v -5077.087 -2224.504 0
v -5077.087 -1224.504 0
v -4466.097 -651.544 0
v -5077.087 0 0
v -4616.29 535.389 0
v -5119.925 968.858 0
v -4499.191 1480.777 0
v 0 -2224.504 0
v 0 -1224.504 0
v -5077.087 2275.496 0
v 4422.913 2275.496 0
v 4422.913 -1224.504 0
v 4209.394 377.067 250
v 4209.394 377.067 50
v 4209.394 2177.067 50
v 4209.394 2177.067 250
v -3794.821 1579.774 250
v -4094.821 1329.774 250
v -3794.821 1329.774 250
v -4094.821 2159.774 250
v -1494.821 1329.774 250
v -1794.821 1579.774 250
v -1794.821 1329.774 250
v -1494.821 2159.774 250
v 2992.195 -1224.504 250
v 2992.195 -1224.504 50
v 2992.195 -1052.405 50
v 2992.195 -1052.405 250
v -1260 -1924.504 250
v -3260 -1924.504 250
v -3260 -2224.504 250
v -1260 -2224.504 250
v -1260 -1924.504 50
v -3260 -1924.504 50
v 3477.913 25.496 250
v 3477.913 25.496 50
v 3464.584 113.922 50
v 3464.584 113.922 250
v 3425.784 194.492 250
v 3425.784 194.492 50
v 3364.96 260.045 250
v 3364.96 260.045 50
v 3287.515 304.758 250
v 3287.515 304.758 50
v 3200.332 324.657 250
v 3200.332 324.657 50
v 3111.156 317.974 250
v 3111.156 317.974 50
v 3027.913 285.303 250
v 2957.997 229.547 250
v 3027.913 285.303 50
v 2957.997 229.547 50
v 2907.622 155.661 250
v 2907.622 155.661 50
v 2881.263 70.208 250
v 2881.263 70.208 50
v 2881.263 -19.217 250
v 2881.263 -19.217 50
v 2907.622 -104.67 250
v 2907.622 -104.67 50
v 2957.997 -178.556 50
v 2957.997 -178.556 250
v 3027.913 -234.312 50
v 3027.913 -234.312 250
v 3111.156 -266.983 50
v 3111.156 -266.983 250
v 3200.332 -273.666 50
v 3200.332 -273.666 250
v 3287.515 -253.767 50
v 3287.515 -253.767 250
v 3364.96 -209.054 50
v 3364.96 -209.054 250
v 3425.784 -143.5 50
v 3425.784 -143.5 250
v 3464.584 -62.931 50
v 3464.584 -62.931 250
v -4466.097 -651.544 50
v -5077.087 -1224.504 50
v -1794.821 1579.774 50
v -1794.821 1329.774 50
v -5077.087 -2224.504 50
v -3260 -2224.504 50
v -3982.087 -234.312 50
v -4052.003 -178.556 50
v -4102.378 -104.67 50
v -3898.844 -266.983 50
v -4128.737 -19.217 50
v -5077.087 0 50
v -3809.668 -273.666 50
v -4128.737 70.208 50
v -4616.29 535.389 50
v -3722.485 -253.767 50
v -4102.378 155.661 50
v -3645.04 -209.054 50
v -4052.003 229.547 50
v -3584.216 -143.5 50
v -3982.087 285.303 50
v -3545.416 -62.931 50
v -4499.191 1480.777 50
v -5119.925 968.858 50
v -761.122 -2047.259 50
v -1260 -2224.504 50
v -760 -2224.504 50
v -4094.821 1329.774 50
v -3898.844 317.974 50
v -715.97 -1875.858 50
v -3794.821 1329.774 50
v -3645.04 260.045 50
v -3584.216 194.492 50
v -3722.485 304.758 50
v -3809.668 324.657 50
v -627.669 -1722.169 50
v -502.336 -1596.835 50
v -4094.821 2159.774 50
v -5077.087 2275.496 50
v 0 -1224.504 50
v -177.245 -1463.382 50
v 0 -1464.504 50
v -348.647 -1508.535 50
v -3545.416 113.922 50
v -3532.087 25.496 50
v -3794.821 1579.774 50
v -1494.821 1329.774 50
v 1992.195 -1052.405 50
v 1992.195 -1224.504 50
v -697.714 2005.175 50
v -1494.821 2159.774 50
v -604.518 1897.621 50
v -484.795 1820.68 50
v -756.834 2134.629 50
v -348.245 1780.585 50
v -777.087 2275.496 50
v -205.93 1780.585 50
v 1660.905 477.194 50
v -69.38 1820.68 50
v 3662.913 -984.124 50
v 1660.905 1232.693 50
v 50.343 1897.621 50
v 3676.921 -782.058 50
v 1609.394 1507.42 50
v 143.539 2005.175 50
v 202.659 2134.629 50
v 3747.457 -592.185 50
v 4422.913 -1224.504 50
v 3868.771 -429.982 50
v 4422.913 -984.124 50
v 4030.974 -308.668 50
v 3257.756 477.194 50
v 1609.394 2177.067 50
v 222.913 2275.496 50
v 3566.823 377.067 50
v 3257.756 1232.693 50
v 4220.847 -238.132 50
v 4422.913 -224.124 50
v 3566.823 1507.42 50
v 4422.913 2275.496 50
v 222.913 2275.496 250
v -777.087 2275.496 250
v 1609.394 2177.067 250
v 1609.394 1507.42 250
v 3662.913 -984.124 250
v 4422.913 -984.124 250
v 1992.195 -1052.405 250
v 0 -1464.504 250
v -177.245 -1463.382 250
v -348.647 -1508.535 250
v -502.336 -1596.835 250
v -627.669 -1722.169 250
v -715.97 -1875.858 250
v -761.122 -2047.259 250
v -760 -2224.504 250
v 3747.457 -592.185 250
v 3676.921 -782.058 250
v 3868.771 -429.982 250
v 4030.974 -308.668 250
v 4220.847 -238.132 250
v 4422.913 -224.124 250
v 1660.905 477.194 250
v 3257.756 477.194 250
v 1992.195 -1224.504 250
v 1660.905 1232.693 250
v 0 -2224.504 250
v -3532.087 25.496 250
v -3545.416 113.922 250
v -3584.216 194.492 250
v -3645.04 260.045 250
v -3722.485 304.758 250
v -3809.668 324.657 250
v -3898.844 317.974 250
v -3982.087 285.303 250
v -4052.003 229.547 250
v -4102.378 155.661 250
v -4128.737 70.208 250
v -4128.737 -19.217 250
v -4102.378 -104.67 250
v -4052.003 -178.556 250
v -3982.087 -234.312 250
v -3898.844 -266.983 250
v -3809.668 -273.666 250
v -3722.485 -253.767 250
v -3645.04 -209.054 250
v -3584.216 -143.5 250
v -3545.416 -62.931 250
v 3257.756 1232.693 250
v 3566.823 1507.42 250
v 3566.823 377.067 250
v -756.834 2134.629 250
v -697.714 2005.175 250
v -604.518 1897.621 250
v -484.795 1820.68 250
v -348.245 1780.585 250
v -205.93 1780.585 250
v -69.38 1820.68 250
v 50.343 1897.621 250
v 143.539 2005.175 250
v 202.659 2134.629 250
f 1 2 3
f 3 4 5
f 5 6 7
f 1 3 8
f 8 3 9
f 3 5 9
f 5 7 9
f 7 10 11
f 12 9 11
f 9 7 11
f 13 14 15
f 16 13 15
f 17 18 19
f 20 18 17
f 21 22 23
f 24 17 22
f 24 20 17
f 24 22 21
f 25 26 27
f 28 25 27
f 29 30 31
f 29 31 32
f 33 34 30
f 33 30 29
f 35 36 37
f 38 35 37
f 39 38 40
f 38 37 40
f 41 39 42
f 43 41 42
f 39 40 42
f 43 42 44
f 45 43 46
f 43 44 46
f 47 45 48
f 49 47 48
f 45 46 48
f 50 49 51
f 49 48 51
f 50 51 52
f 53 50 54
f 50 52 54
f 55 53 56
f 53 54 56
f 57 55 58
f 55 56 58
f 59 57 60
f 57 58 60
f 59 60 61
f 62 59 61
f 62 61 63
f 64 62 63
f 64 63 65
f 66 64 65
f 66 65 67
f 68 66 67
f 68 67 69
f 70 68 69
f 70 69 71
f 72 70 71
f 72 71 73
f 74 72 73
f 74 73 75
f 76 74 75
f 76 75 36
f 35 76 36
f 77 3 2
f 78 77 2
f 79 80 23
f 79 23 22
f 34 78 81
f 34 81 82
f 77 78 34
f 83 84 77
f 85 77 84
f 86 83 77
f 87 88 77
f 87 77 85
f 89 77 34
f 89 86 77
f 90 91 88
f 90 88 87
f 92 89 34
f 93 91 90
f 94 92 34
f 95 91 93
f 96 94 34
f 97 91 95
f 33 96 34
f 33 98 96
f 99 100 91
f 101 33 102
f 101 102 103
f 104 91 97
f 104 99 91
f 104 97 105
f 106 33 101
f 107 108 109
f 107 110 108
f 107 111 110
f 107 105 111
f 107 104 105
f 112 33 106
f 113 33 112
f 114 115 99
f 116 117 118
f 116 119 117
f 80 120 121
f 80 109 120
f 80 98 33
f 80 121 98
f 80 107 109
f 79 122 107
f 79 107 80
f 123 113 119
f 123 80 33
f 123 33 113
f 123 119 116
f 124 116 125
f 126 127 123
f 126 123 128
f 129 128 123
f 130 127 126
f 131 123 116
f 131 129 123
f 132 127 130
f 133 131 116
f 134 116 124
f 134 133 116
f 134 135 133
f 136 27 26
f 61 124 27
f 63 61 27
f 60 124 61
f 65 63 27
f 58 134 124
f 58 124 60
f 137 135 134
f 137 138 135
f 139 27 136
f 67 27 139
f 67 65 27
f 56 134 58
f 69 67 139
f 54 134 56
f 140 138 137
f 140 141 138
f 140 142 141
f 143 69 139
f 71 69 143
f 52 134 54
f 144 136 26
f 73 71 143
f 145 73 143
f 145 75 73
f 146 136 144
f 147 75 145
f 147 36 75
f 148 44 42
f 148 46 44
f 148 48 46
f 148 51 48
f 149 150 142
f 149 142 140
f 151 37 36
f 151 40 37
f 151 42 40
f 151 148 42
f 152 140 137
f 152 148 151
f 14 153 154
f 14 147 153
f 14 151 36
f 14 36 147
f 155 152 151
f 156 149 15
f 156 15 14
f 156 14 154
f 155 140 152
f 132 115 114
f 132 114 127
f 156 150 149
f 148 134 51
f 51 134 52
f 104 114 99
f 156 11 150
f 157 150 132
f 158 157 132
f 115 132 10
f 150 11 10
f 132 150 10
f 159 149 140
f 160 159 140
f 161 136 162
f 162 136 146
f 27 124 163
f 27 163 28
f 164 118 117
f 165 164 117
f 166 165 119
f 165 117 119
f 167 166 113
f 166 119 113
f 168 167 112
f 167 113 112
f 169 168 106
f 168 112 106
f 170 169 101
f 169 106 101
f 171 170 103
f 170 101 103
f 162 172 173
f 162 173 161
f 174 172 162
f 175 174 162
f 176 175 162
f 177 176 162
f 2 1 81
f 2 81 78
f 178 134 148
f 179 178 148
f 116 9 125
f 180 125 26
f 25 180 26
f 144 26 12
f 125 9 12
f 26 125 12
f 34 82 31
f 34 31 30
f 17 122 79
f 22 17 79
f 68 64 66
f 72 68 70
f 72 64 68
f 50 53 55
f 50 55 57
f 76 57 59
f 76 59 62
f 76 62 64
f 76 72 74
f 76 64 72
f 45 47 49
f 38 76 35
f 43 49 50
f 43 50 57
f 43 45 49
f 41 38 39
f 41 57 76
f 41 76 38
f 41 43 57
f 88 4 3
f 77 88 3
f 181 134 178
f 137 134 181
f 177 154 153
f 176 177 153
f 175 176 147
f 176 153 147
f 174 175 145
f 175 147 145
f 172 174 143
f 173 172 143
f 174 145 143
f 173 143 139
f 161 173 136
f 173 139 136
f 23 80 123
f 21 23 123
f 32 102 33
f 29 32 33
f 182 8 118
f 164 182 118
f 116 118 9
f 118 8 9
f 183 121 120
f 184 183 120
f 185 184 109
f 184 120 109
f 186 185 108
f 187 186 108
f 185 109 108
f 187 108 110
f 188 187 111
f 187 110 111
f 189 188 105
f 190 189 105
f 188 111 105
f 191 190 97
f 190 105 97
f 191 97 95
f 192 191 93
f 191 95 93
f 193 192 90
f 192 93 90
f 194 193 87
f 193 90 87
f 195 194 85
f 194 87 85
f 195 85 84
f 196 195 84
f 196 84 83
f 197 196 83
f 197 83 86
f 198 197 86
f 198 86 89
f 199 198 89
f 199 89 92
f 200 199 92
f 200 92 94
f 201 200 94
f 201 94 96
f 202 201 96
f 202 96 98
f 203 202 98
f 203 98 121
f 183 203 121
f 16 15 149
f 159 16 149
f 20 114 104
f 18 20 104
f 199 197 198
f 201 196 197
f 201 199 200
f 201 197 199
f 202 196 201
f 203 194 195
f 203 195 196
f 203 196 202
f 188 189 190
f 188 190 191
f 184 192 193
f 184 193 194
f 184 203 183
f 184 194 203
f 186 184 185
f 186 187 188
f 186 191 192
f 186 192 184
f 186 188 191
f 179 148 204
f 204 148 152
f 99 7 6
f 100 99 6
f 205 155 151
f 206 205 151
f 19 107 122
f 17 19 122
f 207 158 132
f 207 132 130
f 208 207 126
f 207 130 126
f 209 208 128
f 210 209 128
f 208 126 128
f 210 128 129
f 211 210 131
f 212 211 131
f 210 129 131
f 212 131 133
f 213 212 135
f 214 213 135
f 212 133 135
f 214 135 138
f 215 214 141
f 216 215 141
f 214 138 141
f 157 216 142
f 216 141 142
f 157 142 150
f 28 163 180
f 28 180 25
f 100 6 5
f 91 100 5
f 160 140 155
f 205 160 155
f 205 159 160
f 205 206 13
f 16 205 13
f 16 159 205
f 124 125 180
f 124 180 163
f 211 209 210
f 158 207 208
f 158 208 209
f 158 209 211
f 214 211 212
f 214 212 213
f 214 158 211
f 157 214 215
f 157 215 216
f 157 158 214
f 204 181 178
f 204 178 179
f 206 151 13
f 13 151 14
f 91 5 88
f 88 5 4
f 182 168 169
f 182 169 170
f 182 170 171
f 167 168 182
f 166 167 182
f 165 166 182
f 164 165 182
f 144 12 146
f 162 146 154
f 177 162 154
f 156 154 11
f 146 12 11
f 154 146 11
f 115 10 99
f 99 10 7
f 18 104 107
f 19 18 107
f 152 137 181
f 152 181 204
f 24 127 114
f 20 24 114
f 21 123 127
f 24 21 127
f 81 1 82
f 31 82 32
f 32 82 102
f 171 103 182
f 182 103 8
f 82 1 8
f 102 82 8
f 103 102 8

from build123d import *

# Parameters (mm, degrees)
F0_W      = 5077.0874023438
F0_H      = 1000
F1_DEPTH  = 50
F2_W      = 300
F2_H      = 250
F2_W_2    = 1596.8501567841
F2_H_2    = 755.4990053177
F2_W_3    = 1000
F2_H_3    = 172.0993051472
F2_W_4    = 2000
F2_H_4    = 300
F2_R      = 300
F3_DEPTH  = 200
F4_DEPTH  = 200
F5_DEPTH  = 200
F6_DEPTH  = 200
F7_DEPTH  = 200
F8_DEPTH  = 200
F10_DEPTH = 25


# Not quite as in the source:
# - the program builds the solid bodies; features that only make, move or delete a surface that nothing else refers to are left out


with BuildPart() as f1:
    # F0 (on Top) → F1 (new body)
    with BuildSketch(Plane.XY):
        Polygon((-777.0874023438, 2275.4955291748), (-5077.0874023438, 2275.4955291748), (-4499.191295666, 1480.7769234966), (-5119.9254926672, 968.8577861197), (-4616.2895248949, 535.3893431642), (-5077.0874023438, 0), (-4466.0972264549, -651.5435160618), (-5077.0874023438, -1224.5044708252), (0, -1224.5044708252), (4422.9125976562, -1224.5044708252), (4422.9125976562, 2275.4955291748), (222.9125976562, 2275.4955291748), align=None)
        with Locations((-2538.5437011719, -1724.5044708252)):
            Rectangle(F0_W, F0_H)
    extrude(amount=F1_DEPTH)

    # F2 (on face) → F3 (join)
    with BuildSketch(Plane.XY.offset(50)):
        Polygon((-1494.8213815689, 2159.7741413116), (-4094.8213815689, 2159.7741413116), (-4094.8213815689, 1579.7741413116), (-3794.8213815689, 1579.7741413116), (-1794.8213815689, 1579.7741413116), (-1494.8213815689, 1579.7741413116), align=None)
        with Locations((-3944.8213815689, 1454.7741413116)):
            Rectangle(F2_W, F2_H)
        with Locations((-1644.8213815689, 1454.7741413116)):
            Rectangle(F2_W, F2_H)
        Polygon((4209.393954277, 2177.0670413971), (1609.393954277, 2177.0670413971), (1609.393954277, 1507.4201822281), (3566.8230056763, 1507.4201822281), (3566.8230056763, 377.0670413971), (4209.393954277, 377.0670413971), align=None)
        with Locations((2459.3304395676, 854.9439311028)):
            Rectangle(F2_W_2, F2_H_2)
        with Locations((2492.1946525574, -1138.4548182516)):
            Rectangle(F2_W_3, F2_H_3)
        with BuildLine():
            Line((222.9125976562, 2275.4955291748), (-777.0874023438, 2275.4955291748))
            ThreePointArc((-777.0874023438, 2275.4955291748), (-277.0874023438, 1775.4955291748), (222.9125976562, 2275.4955291748))
        make_face()
        with BuildLine():
            Line((3662.9125976562, -984.1235280037), (4422.9125976562, -984.1235280037))
            Line((4422.9125976562, -984.1235280037), (4422.9125976562, -224.1235280037))
            ThreePointArc((4422.9125976562, -224.1235280037), (3868.7706575404, -429.9815878879), (3662.9125976562, -984.1235280037))
        make_face()
        with Locations((-2260, -2074.5044708252)):
            Rectangle(F2_W_4, F2_H_4)
        with BuildLine():
            Line((-760, -2224.5044708252), (0, -2224.5044708252))
            Line((0, -2224.5044708252), (0, -1464.5044708252))
            ThreePointArc((0, -1464.5044708252), (-569.1431166961, -1655.361354129), (-760, -2224.5044708252))
        make_face()
        with Locations((-3832.0874023438, 25.4955291748)):
            Circle(F2_R)
        with Locations((3177.9125976562, 25.4955291748)):
            Circle(F2_R)
    extrude(amount=F3_DEPTH)

    # F2 (on face) → F4 (join)
    with BuildSketch(Plane.XY.offset(50)):
        Polygon((-1494.8213815689, 2159.7741413116), (-4094.8213815689, 2159.7741413116), (-4094.8213815689, 1579.7741413116), (-3794.8213815689, 1579.7741413116), (-1794.8213815689, 1579.7741413116), (-1494.8213815689, 1579.7741413116), align=None)
        with Locations((-3944.8213815689, 1454.7741413116)):
            Rectangle(F2_W, F2_H)
        with Locations((-1644.8213815689, 1454.7741413116)):
            Rectangle(F2_W, F2_H)
        Polygon((4209.393954277, 2177.0670413971), (1609.393954277, 2177.0670413971), (1609.393954277, 1507.4201822281), (3566.8230056763, 1507.4201822281), (3566.8230056763, 377.0670413971), (4209.393954277, 377.0670413971), align=None)
        with Locations((2459.3304395676, 854.9439311028)):
            Rectangle(F2_W_2, F2_H_2)
        with Locations((2492.1946525574, -1138.4548182516)):
            Rectangle(F2_W_3, F2_H_3)
        with BuildLine():
            Line((222.9125976562, 2275.4955291748), (-777.0874023438, 2275.4955291748))
            ThreePointArc((-777.0874023438, 2275.4955291748), (-277.0874023438, 1775.4955291748), (222.9125976562, 2275.4955291748))
        make_face()
        with BuildLine():
            Line((3662.9125976562, -984.1235280037), (4422.9125976562, -984.1235280037))
            Line((4422.9125976562, -984.1235280037), (4422.9125976562, -224.1235280037))
            ThreePointArc((4422.9125976562, -224.1235280037), (3868.7706575404, -429.9815878879), (3662.9125976562, -984.1235280037))
        make_face()
        with Locations((-2260, -2074.5044708252)):
            Rectangle(F2_W_4, F2_H_4)
        with BuildLine():
            Line((-760, -2224.5044708252), (0, -2224.5044708252))
            Line((0, -2224.5044708252), (0, -1464.5044708252))
            ThreePointArc((0, -1464.5044708252), (-569.1431166961, -1655.361354129), (-760, -2224.5044708252))
        make_face()
        with Locations((-3832.0874023438, 25.4955291748)):
            Circle(F2_R)
        with Locations((3177.9125976562, 25.4955291748)):
            Circle(F2_R)
    extrude(amount=F4_DEPTH)

    # F2 (on face) → F5 (join)
    with BuildSketch(Plane.XY.offset(50)):
        Polygon((-1494.8213815689, 2159.7741413116), (-4094.8213815689, 2159.7741413116), (-4094.8213815689, 1579.7741413116), (-3794.8213815689, 1579.7741413116), (-1794.8213815689, 1579.7741413116), (-1494.8213815689, 1579.7741413116), align=None)
        with Locations((-3944.8213815689, 1454.7741413116)):
            Rectangle(F2_W, F2_H)
        with Locations((-1644.8213815689, 1454.7741413116)):
            Rectangle(F2_W, F2_H)
        Polygon((4209.393954277, 2177.0670413971), (1609.393954277, 2177.0670413971), (1609.393954277, 1507.4201822281), (3566.8230056763, 1507.4201822281), (3566.8230056763, 377.0670413971), (4209.393954277, 377.0670413971), align=None)
        with Locations((2459.3304395676, 854.9439311028)):
            Rectangle(F2_W_2, F2_H_2)
        with Locations((2492.1946525574, -1138.4548182516)):
            Rectangle(F2_W_3, F2_H_3)
        with BuildLine():
            Line((222.9125976562, 2275.4955291748), (-777.0874023438, 2275.4955291748))
            ThreePointArc((-777.0874023438, 2275.4955291748), (-277.0874023438, 1775.4955291748), (222.9125976562, 2275.4955291748))
        make_face()
        with BuildLine():
            Line((3662.9125976562, -984.1235280037), (4422.9125976562, -984.1235280037))
            Line((4422.9125976562, -984.1235280037), (4422.9125976562, -224.1235280037))
            ThreePointArc((4422.9125976562, -224.1235280037), (3868.7706575404, -429.9815878879), (3662.9125976562, -984.1235280037))
        make_face()
        with Locations((-2260, -2074.5044708252)):
            Rectangle(F2_W_4, F2_H_4)
        with BuildLine():
            Line((-760, -2224.5044708252), (0, -2224.5044708252))
            Line((0, -2224.5044708252), (0, -1464.5044708252))
            ThreePointArc((0, -1464.5044708252), (-569.1431166961, -1655.361354129), (-760, -2224.5044708252))
        make_face()
        with Locations((-3832.0874023438, 25.4955291748)):
            Circle(F2_R)
        with Locations((3177.9125976562, 25.4955291748)):
            Circle(F2_R)
    extrude(amount=F5_DEPTH)

    # F2 (on face) → F6 (join)
    with BuildSketch(Plane.XY.offset(50)):
        Polygon((-1494.8213815689, 2159.7741413116), (-4094.8213815689, 2159.7741413116), (-4094.8213815689, 1579.7741413116), (-3794.8213815689, 1579.7741413116), (-1794.8213815689, 1579.7741413116), (-1494.8213815689, 1579.7741413116), align=None)
        with Locations((-3944.8213815689, 1454.7741413116)):
            Rectangle(F2_W, F2_H)
        with Locations((-1644.8213815689, 1454.7741413116)):
            Rectangle(F2_W, F2_H)
        Polygon((4209.393954277, 2177.0670413971), (1609.393954277, 2177.0670413971), (1609.393954277, 1507.4201822281), (3566.8230056763, 1507.4201822281), (3566.8230056763, 377.0670413971), (4209.393954277, 377.0670413971), align=None)
        with Locations((2459.3304395676, 854.9439311028)):
            Rectangle(F2_W_2, F2_H_2)
        with Locations((2492.1946525574, -1138.4548182516)):
            Rectangle(F2_W_3, F2_H_3)
        with BuildLine():
            Line((222.9125976562, 2275.4955291748), (-777.0874023438, 2275.4955291748))
            ThreePointArc((-777.0874023438, 2275.4955291748), (-277.0874023438, 1775.4955291748), (222.9125976562, 2275.4955291748))
        make_face()
        with BuildLine():
            Line((3662.9125976562, -984.1235280037), (4422.9125976562, -984.1235280037))
            Line((4422.9125976562, -984.1235280037), (4422.9125976562, -224.1235280037))
            ThreePointArc((4422.9125976562, -224.1235280037), (3868.7706575404, -429.9815878879), (3662.9125976562, -984.1235280037))
        make_face()
        with Locations((-2260, -2074.5044708252)):
            Rectangle(F2_W_4, F2_H_4)
        with BuildLine():
            Line((-760, -2224.5044708252), (0, -2224.5044708252))
            Line((0, -2224.5044708252), (0, -1464.5044708252))
            ThreePointArc((0, -1464.5044708252), (-569.1431166961, -1655.361354129), (-760, -2224.5044708252))
        make_face()
        with Locations((-3832.0874023438, 25.4955291748)):
            Circle(F2_R)
        with Locations((3177.9125976562, 25.4955291748)):
            Circle(F2_R)
    extrude(amount=F6_DEPTH)

    # F2 (on face) → F7 (join)
    with BuildSketch(Plane.XY.offset(50)):
        Polygon((-1494.8213815689, 2159.7741413116), (-4094.8213815689, 2159.7741413116), (-4094.8213815689, 1579.7741413116), (-3794.8213815689, 1579.7741413116), (-1794.8213815689, 1579.7741413116), (-1494.8213815689, 1579.7741413116), align=None)
        with Locations((-3944.8213815689, 1454.7741413116)):
            Rectangle(F2_W, F2_H)
        with Locations((-1644.8213815689, 1454.7741413116)):
            Rectangle(F2_W, F2_H)
        Polygon((4209.393954277, 2177.0670413971), (1609.393954277, 2177.0670413971), (1609.393954277, 1507.4201822281), (3566.8230056763, 1507.4201822281), (3566.8230056763, 377.0670413971), (4209.393954277, 377.0670413971), align=None)
        with Locations((2459.3304395676, 854.9439311028)):
            Rectangle(F2_W_2, F2_H_2)
        with Locations((2492.1946525574, -1138.4548182516)):
            Rectangle(F2_W_3, F2_H_3)
        with BuildLine():
            Line((222.9125976562, 2275.4955291748), (-777.0874023438, 2275.4955291748))
            ThreePointArc((-777.0874023438, 2275.4955291748), (-277.0874023438, 1775.4955291748), (222.9125976562, 2275.4955291748))
        make_face()
        with BuildLine():
            Line((3662.9125976562, -984.1235280037), (4422.9125976562, -984.1235280037))
            Line((4422.9125976562, -984.1235280037), (4422.9125976562, -224.1235280037))
            ThreePointArc((4422.9125976562, -224.1235280037), (3868.7706575404, -429.9815878879), (3662.9125976562, -984.1235280037))
        make_face()
        with Locations((-2260, -2074.5044708252)):
            Rectangle(F2_W_4, F2_H_4)
        with BuildLine():
            Line((-760, -2224.5044708252), (0, -2224.5044708252))
            Line((0, -2224.5044708252), (0, -1464.5044708252))
            ThreePointArc((0, -1464.5044708252), (-569.1431166961, -1655.361354129), (-760, -2224.5044708252))
        make_face()
        with Locations((-3832.0874023438, 25.4955291748)):
            Circle(F2_R)
        with Locations((3177.9125976562, 25.4955291748)):
            Circle(F2_R)
    extrude(amount=F7_DEPTH)

    # F2 (on face) → F8 (join)
    with BuildSketch(Plane.XY.offset(50)):
        Polygon((-1494.8213815689, 2159.7741413116), (-4094.8213815689, 2159.7741413116), (-4094.8213815689, 1579.7741413116), (-3794.8213815689, 1579.7741413116), (-1794.8213815689, 1579.7741413116), (-1494.8213815689, 1579.7741413116), align=None)
        with Locations((-3944.8213815689, 1454.7741413116)):
            Rectangle(F2_W, F2_H)
        with Locations((-1644.8213815689, 1454.7741413116)):
            Rectangle(F2_W, F2_H)
        Polygon((4209.393954277, 2177.0670413971), (1609.393954277, 2177.0670413971), (1609.393954277, 1507.4201822281), (3566.8230056763, 1507.4201822281), (3566.8230056763, 377.0670413971), (4209.393954277, 377.0670413971), align=None)
        with Locations((2459.3304395676, 854.9439311028)):
            Rectangle(F2_W_2, F2_H_2)
        with Locations((2492.1946525574, -1138.4548182516)):
            Rectangle(F2_W_3, F2_H_3)
        with BuildLine():
            Line((222.9125976562, 2275.4955291748), (-777.0874023438, 2275.4955291748))
            ThreePointArc((-777.0874023438, 2275.4955291748), (-277.0874023438, 1775.4955291748), (222.9125976562, 2275.4955291748))
        make_face()
        with BuildLine():
            Line((3662.9125976562, -984.1235280037), (4422.9125976562, -984.1235280037))
            Line((4422.9125976562, -984.1235280037), (4422.9125976562, -224.1235280037))
            ThreePointArc((4422.9125976562, -224.1235280037), (3868.7706575404, -429.9815878879), (3662.9125976562, -984.1235280037))
        make_face()
        with Locations((-2260, -2074.5044708252)):
            Rectangle(F2_W_4, F2_H_4)
        with BuildLine():
            Line((-760, -2224.5044708252), (0, -2224.5044708252))
            Line((0, -2224.5044708252), (0, -1464.5044708252))
            ThreePointArc((0, -1464.5044708252), (-569.1431166961, -1655.361354129), (-760, -2224.5044708252))
        make_face()
        with Locations((-3832.0874023438, 25.4955291748)):
            Circle(F2_R)
        with Locations((3177.9125976562, 25.4955291748)):
            Circle(F2_R)
    extrude(amount=F8_DEPTH)

    # F2 (on face) → F10 (join)
    with BuildSketch(Plane.XY.offset(50)):
        Polygon((-1494.8213815689, 2159.7741413116), (-4094.8213815689, 2159.7741413116), (-4094.8213815689, 1579.7741413116), (-3794.8213815689, 1579.7741413116), (-1794.8213815689, 1579.7741413116), (-1494.8213815689, 1579.7741413116), align=None)
        with Locations((-3944.8213815689, 1454.7741413116)):
            Rectangle(F2_W, F2_H)
        with Locations((-1644.8213815689, 1454.7741413116)):
            Rectangle(F2_W, F2_H)
        Polygon((4209.393954277, 2177.0670413971), (1609.393954277, 2177.0670413971), (1609.393954277, 1507.4201822281), (3566.8230056763, 1507.4201822281), (3566.8230056763, 377.0670413971), (4209.393954277, 377.0670413971), align=None)
        with Locations((2459.3304395676, 854.9439311028)):
            Rectangle(F2_W_2, F2_H_2)
        with Locations((2492.1946525574, -1138.4548182516)):
            Rectangle(F2_W_3, F2_H_3)
        with BuildLine():
            Line((222.9125976562, 2275.4955291748), (-777.0874023438, 2275.4955291748))
            ThreePointArc((-777.0874023438, 2275.4955291748), (-277.0874023438, 1775.4955291748), (222.9125976562, 2275.4955291748))
        make_face()
        with BuildLine():
            Line((3662.9125976562, -984.1235280037), (4422.9125976562, -984.1235280037))
            Line((4422.9125976562, -984.1235280037), (4422.9125976562, -224.1235280037))
            ThreePointArc((4422.9125976562, -224.1235280037), (3868.7706575404, -429.9815878879), (3662.9125976562, -984.1235280037))
        make_face()
        with Locations((-2260, -2074.5044708252)):
            Rectangle(F2_W_4, F2_H_4)
        with BuildLine():
            Line((-760, -2224.5044708252), (0, -2224.5044708252))
            Line((0, -2224.5044708252), (0, -1464.5044708252))
            ThreePointArc((0, -1464.5044708252), (-569.1431166961, -1655.361354129), (-760, -2224.5044708252))
        make_face()
        with Locations((-3832.0874023438, 25.4955291748)):
            Circle(F2_R)
        with Locations((3177.9125976562, 25.4955291748)):
            Circle(F2_R)
    extrude(amount=F10_DEPTH)


solid = f1.part
